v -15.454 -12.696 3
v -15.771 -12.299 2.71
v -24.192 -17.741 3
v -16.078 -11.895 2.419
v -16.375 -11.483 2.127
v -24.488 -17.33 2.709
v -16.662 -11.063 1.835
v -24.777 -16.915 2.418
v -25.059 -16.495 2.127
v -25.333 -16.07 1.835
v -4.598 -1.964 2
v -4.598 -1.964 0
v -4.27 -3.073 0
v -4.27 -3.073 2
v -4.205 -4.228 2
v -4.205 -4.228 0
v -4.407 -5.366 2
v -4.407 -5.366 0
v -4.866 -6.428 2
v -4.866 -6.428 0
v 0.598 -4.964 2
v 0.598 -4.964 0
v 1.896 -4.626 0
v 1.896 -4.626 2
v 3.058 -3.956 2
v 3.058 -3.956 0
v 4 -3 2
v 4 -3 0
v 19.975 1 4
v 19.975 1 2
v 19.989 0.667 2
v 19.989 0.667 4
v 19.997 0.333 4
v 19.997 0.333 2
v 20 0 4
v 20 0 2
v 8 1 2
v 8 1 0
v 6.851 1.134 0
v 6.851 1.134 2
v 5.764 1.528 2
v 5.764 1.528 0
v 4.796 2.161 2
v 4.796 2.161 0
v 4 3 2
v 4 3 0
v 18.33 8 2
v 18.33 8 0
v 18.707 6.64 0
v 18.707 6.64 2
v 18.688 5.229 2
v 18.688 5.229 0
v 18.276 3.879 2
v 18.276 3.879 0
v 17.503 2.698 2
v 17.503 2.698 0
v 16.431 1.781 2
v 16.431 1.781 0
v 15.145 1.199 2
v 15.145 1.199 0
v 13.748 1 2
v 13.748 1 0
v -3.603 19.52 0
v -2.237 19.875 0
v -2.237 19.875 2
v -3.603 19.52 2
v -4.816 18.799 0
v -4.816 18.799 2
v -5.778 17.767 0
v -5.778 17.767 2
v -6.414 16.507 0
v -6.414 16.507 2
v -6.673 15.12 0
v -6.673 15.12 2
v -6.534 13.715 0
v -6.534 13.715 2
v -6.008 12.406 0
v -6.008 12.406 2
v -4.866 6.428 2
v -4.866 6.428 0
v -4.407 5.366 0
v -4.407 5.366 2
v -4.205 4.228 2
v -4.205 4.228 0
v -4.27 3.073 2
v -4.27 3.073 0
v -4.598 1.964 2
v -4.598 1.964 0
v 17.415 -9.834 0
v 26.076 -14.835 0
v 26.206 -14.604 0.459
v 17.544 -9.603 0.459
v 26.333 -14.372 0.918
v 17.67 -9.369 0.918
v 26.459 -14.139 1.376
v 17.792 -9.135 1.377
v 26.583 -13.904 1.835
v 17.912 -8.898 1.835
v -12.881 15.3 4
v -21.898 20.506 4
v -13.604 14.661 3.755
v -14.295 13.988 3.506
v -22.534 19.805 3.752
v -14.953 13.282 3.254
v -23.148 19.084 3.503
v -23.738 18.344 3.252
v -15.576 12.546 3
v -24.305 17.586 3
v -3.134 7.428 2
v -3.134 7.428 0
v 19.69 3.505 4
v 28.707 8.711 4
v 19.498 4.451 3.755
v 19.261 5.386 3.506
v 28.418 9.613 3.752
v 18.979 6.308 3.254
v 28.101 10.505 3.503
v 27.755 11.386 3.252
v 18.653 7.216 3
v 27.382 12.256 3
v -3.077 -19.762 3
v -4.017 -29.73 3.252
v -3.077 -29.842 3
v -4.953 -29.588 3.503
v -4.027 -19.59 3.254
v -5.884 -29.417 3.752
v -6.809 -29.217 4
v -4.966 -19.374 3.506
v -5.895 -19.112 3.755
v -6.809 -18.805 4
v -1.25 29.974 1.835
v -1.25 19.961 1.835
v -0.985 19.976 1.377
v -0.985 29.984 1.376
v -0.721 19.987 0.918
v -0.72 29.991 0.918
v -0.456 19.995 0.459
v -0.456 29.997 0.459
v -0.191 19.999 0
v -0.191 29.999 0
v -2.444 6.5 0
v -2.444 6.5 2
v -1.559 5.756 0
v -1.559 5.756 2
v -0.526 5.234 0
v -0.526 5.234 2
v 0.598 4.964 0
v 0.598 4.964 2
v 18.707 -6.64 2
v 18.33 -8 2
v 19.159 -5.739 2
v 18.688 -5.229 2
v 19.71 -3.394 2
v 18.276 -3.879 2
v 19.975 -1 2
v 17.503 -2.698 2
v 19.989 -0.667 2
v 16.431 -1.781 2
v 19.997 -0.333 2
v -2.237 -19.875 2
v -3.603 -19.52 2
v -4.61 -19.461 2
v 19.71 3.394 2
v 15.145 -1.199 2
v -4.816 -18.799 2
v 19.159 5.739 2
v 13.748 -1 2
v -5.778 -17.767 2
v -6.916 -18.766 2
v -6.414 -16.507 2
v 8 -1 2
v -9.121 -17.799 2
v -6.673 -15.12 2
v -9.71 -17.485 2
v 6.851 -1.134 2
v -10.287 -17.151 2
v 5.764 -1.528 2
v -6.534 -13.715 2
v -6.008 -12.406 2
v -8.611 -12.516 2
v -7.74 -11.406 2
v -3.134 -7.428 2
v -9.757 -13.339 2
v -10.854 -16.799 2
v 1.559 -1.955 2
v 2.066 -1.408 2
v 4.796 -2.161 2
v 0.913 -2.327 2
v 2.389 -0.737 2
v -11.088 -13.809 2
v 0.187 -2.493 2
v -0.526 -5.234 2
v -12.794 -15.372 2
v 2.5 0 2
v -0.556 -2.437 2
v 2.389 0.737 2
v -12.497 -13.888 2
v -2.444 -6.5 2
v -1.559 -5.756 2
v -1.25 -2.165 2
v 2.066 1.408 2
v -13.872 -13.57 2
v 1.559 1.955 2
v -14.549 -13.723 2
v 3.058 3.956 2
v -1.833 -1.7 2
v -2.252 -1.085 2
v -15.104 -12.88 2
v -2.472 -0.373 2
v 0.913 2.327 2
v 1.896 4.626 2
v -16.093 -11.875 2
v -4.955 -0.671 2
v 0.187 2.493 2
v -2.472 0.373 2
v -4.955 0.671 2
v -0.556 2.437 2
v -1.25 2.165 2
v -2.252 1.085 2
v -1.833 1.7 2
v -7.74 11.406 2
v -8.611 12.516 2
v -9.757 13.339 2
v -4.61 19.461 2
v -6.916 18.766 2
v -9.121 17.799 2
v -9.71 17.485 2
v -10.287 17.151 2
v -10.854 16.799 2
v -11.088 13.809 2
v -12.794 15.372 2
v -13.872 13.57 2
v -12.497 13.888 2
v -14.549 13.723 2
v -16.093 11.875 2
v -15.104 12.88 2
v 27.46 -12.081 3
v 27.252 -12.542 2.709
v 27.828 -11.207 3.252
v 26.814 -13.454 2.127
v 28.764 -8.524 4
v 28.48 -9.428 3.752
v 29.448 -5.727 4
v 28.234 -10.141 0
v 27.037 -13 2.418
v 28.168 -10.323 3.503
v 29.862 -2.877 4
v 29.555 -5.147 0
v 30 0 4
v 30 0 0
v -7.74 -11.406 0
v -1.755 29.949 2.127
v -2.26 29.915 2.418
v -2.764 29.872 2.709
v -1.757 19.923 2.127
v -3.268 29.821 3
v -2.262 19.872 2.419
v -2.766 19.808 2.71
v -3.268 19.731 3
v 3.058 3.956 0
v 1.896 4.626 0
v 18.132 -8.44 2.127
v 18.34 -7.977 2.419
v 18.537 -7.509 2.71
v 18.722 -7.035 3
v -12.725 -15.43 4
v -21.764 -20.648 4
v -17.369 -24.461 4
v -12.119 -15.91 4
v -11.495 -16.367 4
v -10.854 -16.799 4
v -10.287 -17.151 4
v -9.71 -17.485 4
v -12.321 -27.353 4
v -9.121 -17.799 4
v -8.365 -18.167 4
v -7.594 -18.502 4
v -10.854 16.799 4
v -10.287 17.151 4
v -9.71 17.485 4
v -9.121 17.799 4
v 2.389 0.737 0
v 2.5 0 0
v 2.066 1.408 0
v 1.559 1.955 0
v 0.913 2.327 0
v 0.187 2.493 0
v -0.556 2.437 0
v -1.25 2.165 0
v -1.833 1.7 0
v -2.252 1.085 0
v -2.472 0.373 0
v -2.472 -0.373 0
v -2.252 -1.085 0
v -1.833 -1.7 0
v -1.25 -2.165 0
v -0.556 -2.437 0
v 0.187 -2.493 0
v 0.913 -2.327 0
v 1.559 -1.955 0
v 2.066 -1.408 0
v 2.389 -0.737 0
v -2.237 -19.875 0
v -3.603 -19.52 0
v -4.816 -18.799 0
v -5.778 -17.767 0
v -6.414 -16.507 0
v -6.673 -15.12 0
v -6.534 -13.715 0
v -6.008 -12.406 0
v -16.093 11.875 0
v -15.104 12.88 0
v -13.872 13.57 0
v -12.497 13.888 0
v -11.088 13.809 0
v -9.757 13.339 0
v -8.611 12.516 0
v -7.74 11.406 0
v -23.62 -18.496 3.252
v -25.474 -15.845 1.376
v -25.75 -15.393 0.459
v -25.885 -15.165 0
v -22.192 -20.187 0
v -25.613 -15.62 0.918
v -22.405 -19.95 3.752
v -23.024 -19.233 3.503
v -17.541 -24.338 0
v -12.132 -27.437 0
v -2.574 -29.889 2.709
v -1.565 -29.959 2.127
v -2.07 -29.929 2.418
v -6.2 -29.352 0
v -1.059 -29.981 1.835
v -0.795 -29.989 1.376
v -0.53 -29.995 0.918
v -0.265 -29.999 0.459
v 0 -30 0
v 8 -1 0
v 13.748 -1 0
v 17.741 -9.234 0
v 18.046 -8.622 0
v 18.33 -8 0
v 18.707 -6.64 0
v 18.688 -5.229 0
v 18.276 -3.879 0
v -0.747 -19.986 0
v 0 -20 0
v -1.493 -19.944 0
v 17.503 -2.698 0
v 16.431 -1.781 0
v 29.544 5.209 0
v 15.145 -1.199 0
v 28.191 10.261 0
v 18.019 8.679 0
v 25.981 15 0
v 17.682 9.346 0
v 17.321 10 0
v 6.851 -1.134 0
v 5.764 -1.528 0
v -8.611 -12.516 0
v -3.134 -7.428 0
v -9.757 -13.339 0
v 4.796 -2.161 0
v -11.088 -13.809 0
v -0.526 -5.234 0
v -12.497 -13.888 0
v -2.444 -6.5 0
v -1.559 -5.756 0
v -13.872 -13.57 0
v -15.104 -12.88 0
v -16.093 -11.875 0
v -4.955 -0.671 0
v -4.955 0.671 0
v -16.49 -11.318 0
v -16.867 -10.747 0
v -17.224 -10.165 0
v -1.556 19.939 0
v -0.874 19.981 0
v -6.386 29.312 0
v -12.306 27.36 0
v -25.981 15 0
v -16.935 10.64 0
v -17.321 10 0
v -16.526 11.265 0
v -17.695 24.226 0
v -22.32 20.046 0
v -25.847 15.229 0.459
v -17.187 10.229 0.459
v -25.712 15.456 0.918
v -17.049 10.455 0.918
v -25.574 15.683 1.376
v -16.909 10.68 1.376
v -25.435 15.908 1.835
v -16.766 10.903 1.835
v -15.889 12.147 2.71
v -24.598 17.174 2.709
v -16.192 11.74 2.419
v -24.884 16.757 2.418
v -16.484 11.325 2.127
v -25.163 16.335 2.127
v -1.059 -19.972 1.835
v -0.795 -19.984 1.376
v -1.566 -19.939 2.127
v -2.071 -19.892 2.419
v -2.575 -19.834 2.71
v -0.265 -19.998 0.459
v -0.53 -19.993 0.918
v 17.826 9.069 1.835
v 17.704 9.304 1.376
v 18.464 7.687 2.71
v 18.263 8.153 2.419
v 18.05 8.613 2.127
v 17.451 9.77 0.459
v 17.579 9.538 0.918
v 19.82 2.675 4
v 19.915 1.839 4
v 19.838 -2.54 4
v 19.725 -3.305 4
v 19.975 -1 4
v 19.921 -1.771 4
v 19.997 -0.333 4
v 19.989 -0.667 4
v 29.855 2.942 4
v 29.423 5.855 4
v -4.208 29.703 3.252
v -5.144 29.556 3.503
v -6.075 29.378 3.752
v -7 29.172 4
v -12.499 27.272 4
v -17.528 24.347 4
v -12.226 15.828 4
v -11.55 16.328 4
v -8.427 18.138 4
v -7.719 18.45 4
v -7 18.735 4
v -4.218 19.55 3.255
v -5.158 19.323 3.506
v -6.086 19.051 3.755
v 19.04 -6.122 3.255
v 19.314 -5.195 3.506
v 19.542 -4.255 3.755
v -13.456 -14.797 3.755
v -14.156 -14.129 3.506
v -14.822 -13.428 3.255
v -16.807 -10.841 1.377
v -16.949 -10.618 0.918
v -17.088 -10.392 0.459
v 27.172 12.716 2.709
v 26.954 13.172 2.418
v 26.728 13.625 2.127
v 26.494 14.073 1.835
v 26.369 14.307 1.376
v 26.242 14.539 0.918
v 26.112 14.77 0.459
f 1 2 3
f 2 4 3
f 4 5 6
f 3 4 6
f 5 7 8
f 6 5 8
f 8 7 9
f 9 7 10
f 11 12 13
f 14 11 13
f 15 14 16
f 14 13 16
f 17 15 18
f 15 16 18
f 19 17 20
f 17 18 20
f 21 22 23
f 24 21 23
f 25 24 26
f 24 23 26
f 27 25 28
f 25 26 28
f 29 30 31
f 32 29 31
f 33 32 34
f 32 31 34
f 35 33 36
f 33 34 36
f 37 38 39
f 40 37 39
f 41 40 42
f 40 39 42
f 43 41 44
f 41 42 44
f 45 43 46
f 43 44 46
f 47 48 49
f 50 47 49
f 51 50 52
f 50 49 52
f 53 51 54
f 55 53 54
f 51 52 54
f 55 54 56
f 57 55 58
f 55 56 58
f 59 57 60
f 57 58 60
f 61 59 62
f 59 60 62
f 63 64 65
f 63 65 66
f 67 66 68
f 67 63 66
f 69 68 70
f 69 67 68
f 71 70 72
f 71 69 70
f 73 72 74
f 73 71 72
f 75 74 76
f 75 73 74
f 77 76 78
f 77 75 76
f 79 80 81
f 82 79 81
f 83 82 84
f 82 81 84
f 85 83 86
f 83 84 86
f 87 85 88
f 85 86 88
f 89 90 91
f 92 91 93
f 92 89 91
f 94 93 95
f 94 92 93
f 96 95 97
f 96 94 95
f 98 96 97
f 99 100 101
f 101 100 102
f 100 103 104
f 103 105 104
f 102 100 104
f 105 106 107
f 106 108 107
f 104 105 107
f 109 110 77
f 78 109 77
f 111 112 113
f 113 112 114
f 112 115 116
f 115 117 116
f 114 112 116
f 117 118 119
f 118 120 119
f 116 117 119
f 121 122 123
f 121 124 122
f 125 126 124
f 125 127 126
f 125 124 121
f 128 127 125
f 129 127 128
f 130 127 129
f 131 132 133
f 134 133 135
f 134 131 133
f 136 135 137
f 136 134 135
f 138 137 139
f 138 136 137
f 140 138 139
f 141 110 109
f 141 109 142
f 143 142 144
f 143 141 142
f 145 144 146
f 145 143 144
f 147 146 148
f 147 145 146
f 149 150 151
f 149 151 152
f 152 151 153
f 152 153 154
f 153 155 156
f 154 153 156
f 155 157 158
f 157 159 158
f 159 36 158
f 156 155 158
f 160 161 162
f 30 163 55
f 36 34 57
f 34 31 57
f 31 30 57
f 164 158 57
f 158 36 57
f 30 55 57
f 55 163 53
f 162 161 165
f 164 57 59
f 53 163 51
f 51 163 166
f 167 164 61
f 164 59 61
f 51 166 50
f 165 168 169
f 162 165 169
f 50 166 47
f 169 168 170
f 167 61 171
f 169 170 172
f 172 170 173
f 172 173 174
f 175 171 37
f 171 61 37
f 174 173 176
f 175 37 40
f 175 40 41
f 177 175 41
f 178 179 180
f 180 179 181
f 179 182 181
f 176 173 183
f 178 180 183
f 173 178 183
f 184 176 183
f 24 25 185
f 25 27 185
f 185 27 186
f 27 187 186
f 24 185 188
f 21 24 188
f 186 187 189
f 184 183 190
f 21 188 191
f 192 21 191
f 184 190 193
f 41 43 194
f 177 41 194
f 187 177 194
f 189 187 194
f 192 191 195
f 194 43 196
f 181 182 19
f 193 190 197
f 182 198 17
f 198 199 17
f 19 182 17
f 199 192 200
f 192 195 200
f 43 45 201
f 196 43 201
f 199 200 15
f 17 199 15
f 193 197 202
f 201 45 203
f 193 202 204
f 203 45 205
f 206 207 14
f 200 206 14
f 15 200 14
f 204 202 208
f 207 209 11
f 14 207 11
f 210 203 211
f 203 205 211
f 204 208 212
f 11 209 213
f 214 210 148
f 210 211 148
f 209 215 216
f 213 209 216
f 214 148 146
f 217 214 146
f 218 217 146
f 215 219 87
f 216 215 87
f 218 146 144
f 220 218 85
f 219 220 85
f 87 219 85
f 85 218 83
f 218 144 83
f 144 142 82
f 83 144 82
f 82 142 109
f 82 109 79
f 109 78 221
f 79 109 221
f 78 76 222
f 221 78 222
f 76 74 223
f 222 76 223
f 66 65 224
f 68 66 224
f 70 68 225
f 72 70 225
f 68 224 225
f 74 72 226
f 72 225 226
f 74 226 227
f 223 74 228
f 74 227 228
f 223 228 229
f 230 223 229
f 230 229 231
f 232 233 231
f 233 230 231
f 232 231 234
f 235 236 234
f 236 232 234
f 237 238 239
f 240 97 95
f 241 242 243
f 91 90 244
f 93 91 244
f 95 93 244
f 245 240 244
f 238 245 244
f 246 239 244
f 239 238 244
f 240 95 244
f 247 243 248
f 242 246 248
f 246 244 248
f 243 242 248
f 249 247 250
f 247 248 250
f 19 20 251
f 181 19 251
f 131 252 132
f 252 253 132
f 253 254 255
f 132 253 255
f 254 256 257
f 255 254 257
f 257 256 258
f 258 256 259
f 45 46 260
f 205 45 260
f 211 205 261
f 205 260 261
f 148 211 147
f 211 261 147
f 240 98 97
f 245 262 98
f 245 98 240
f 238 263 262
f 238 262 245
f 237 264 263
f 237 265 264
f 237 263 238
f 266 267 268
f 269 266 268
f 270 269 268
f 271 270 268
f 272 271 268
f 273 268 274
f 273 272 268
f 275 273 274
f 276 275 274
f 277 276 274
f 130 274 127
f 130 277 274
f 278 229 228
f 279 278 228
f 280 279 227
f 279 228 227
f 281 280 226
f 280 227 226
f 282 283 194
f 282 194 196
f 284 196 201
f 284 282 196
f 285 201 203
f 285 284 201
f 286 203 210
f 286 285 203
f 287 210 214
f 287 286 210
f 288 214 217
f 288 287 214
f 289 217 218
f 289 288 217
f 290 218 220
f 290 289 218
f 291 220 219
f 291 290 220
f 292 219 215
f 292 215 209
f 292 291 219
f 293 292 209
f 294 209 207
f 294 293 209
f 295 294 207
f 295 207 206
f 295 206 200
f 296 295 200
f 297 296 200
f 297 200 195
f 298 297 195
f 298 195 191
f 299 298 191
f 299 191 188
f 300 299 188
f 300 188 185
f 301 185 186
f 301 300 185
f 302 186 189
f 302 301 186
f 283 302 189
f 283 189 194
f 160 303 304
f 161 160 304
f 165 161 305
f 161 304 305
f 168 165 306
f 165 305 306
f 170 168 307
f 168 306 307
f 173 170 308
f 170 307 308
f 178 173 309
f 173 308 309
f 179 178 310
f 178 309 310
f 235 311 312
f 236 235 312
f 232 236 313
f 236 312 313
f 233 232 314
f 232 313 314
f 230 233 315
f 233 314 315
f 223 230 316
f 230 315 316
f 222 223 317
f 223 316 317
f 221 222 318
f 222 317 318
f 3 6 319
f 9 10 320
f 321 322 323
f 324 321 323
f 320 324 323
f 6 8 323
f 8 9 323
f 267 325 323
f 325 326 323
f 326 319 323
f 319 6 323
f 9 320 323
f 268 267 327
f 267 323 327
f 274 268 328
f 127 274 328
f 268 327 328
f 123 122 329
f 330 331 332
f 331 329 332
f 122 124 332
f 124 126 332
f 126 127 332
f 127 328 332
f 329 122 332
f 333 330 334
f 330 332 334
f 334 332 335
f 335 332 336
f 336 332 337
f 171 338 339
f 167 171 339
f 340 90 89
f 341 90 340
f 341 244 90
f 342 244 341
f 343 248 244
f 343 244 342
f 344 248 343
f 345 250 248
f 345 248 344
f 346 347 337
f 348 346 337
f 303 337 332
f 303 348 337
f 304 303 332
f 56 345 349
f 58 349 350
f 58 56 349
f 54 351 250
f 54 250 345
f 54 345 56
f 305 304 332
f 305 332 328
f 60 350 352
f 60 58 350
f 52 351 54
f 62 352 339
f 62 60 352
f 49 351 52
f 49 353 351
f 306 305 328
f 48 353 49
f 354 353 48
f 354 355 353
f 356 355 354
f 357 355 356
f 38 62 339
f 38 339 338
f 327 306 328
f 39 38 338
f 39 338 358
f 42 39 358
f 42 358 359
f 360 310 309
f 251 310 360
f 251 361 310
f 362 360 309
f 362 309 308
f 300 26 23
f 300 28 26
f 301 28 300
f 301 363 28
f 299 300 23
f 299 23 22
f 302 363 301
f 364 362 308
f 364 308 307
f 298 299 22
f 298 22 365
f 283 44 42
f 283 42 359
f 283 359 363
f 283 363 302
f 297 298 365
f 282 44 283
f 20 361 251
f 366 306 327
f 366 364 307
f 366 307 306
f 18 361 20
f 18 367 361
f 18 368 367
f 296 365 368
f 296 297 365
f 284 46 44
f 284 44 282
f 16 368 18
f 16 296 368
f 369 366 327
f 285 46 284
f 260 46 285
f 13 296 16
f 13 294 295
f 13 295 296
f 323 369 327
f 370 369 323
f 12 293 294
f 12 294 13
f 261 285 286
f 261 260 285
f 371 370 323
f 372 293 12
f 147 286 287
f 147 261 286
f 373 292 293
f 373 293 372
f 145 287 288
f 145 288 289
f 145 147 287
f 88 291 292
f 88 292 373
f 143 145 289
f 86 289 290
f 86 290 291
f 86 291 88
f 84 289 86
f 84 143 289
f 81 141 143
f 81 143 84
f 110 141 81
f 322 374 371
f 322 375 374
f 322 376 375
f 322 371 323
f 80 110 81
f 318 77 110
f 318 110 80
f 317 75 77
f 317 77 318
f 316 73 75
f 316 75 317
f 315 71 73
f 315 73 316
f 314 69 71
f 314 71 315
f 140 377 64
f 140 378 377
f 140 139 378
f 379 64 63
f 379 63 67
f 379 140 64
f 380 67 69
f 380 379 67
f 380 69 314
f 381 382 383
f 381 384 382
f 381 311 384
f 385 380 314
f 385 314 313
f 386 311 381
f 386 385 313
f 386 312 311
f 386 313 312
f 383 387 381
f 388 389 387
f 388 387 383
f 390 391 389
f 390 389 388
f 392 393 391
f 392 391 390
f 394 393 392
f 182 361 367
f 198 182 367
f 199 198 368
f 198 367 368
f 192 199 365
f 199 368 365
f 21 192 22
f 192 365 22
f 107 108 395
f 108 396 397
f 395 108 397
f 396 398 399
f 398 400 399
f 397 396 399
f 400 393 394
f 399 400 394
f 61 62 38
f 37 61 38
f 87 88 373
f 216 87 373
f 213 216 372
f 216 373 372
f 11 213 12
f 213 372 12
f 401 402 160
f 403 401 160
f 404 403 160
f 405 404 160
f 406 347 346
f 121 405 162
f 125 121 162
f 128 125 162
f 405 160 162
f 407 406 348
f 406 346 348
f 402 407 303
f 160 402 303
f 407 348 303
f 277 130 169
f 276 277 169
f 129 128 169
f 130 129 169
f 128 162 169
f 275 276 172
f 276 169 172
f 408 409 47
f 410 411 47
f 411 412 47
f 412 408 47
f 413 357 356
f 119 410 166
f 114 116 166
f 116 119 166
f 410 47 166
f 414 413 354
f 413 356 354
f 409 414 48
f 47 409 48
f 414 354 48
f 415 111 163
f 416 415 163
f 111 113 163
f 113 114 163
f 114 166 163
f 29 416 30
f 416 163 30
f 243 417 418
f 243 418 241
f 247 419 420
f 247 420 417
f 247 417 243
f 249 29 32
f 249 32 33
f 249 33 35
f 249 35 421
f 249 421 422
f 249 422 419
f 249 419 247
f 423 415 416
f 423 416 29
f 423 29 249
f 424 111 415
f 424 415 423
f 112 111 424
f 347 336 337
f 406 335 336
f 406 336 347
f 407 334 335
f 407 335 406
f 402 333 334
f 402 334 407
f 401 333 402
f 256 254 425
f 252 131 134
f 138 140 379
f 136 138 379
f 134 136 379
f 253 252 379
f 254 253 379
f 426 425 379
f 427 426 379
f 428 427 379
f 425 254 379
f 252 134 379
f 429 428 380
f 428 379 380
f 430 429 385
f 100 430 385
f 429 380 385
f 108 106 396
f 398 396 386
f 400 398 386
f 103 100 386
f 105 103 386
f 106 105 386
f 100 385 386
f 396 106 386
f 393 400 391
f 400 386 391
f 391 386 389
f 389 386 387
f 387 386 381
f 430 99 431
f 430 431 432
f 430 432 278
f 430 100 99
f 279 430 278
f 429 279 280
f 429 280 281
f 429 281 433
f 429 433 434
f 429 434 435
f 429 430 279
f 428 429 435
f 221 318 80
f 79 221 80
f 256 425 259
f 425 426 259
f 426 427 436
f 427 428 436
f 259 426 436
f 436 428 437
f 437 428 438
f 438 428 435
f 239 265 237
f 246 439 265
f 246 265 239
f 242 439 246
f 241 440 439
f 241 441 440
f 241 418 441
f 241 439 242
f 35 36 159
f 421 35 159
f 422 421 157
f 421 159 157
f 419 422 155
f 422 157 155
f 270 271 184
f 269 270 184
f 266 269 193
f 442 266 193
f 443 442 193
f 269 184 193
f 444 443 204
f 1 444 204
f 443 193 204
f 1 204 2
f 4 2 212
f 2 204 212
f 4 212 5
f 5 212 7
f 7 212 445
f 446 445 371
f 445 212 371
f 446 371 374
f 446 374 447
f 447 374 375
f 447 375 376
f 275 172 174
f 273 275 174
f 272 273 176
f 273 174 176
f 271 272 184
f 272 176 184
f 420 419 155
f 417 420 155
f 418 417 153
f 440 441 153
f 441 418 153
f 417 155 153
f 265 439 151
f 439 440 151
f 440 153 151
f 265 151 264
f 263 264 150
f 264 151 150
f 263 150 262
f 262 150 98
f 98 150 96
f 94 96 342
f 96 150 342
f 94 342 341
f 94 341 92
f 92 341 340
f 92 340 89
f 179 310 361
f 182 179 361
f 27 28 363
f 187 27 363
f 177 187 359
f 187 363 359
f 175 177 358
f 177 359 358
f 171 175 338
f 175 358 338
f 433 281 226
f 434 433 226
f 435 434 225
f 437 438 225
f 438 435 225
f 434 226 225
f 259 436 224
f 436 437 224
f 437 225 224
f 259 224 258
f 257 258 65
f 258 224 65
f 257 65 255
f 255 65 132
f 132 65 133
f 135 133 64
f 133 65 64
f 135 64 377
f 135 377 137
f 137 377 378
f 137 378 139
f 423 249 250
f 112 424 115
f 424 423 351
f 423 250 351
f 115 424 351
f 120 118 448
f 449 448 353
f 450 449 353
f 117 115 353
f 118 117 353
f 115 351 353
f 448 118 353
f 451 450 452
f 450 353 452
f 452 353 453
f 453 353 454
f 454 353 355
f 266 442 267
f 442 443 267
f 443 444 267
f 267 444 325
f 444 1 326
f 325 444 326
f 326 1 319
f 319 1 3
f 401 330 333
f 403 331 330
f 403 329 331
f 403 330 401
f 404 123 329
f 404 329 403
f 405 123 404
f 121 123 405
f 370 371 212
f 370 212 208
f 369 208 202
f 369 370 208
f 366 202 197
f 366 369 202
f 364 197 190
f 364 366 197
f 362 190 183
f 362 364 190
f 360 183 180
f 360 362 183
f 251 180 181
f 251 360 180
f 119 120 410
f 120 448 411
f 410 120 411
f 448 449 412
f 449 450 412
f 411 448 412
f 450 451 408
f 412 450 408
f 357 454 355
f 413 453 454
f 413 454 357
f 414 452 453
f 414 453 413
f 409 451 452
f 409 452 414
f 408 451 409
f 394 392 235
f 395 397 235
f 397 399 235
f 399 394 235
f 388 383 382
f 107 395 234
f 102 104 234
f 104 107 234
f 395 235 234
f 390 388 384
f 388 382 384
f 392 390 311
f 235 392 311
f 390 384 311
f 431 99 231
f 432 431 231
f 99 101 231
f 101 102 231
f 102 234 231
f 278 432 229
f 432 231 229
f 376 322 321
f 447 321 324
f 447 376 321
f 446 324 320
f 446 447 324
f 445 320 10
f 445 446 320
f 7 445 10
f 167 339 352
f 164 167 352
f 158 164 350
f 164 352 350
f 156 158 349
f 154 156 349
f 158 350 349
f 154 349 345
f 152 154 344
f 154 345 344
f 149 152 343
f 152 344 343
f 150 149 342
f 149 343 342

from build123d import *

# Parameters (mm, degrees)
F0_R        = 2.5
F1_DEPTH    = 2
F2_DEPTH    = 4
F3_T1_DEPTH = 2
F4_T1_DEPTH = 32.4048198529
F4_T3_DEPTH = 32.4048198529
F4_T5_DEPTH = 32.4048198529
F5_SIZE2    = 2.309391
F5_SIZE     = 3.99999
F5_2_SIZE2  = 2.309391
F5_2_SIZE   = 3.99999
F5_3_SIZE2  = 2.309391
F5_3_SIZE   = 3.99999
F6_SIZE     = 2.5
F7_SIZE     = 2


# Not quite as in the source:
# - a fillet or chamfer that OpenCascade refuses, or shapes differently, is made with other operations: its cross-section is extruded or revolved along the edge and cut away or added
# - a fillet or chamfer is up to 0.001 mm smaller than in the source, because OpenCascade refuses the exact size


with BuildPart() as f1:
    # F0 (on Top) → F1 (new body)
    with BuildSketch(Plane.XY):
        with BuildLine():
            ThreePointArc((-10.8535175815, -16.798843892), (-10, -17.3205080757), (-9.1214667739, -17.798843892))
            Line((-9.1214667739, -17.798843892), (-1.583464339, -4.7426406871))
            ThreePointArc((-1.583464339, -4.7426406871), (-2.5, -4.3301270189), (-3.3155151466, -3.7426406871))
            Line((-3.3155151466, -3.7426406871), (-10.8535175815, -16.798843892))
        make_face()
        with BuildLine():
            Line((-1.583464339, 4.7426406871), (-9.1214667739, 17.798843892))
            ThreePointArc((-9.1214667739, 17.798843892), (-10, 17.3205080757), (-10.8535175815, 16.798843892))
            Line((-10.8535175815, 16.798843892), (-3.3155151466, 3.7426406871))
            ThreePointArc((-3.3155151466, 3.7426406871), (-2.5, 4.3301270189), (-1.583464339, 4.7426406871))
        make_face()
        with BuildLine():
            ThreePointArc((20, 0), (19.9937451108, 0.5001564212), (19.9749843554, 1))
            Line((19.9749843554, 1), (4.8989794856, 1))
            ThreePointArc((4.8989794856, 1), (4.974680765, 0.50254481), (5, 0))
            ThreePointArc((5, 0), (4.974680765, -0.50254481), (4.8989794856, -1))
            Line((4.8989794856, -1), (19.9749843554, -1))
            ThreePointArc((19.9749843554, -1), (19.9937451108, -0.5001564212), (20, 0))
        make_face()
        with BuildLine():
            ThreePointArc((5, 0), (4.974680765, 0.50254481), (4.8989794856, 1))
            ThreePointArc((4.8989794856, 1), (2.5, 4.3301270189), (-1.583464339, 4.7426406871))
            ThreePointArc((-1.583464339, 4.7426406871), (-2.5, 4.3301270189), (-3.3155151466, 3.7426406871))
            ThreePointArc((-3.3155151466, 3.7426406871), (-5, 0), (-3.3155151466, -3.7426406871))
            ThreePointArc((-3.3155151466, -3.7426406871), (-2.5, -4.3301270189), (-1.583464339, -4.7426406871))
            ThreePointArc((-1.583464339, -4.7426406871), (2.5, -4.3301270189), (4.8989794856, -1))
            ThreePointArc((4.8989794856, -1), (4.974680765, -0.50254481), (5, 0))
        make_face()
        Circle(F0_R, mode=Mode.SUBTRACT)
    extrude(amount=F1_DEPTH)

    # F0 (on Top) → F2 (join)
    with BuildSketch(Plane.XY):
        with BuildLine():
            Line((0, 20), (0, 30))
            ThreePointArc((0, 30), (-15, 25.9807621135), (-25.9807621135, 15))
            Line((-25.9807621135, 15), (-17.3205080757, 10))
            ThreePointArc((-17.3205080757, 10), (-14.4913767462, 13.7840487521), (-10.8535175815, 16.798843892))
            ThreePointArc((-10.8535175815, 16.798843892), (-10, 17.3205080757), (-9.1214667739, 17.798843892))
            ThreePointArc((-9.1214667739, 17.798843892), (-4.6916480132, 19.4419247741), (0, 20))
        make_face()
        with BuildLine():
            ThreePointArc((25.9807621135, -15), (28.9777747887, -7.7645713531), (30, 0))
            ThreePointArc((30, 0), (28.9777747887, 7.7645713531), (25.9807621135, 15))
            Line((25.9807621135, 15), (17.3205080757, 10))
            ThreePointArc((17.3205080757, 10), (19.1830247594, 5.657876022), (19.9749843554, 1))
            ThreePointArc((19.9749843554, 1), (19.9937451108, 0.5001564212), (20, 0))
            ThreePointArc((20, 0), (19.9937451108, -0.5001564212), (19.9749843554, -1))
            ThreePointArc((19.9749843554, -1), (19.1830247594, -5.657876022), (17.3205080757, -10))
            Line((17.3205080757, -10), (25.9807621135, -15))
        make_face()
        with BuildLine():
            ThreePointArc((-25.9807621135, -15), (-15, -25.9807621135), (0, -30))
            Line((0, -30), (0, -20))
            ThreePointArc((0, -20), (-4.6916480132, -19.4419247741), (-9.1214667739, -17.798843892))
            ThreePointArc((-9.1214667739, -17.798843892), (-10, -17.3205080757), (-10.8535175815, -16.798843892))
            ThreePointArc((-10.8535175815, -16.798843892), (-14.4913767462, -13.7840487521), (-17.3205080757, -10))
            Line((-17.3205080757, -10), (-25.9807621135, -15))
        make_face()
    extrude(amount=F2_DEPTH)

    # F3: fillet of radius 5 on 12 edges, made by hand

    # F3_s2 → F3_t1 (join)
    with BuildSketch(Plane.XY):
        with BuildLine():
            ThreePointArc((-2.2369481596, 19.8745078664), (-6.1410694312, 17.1594186926), (-6.0078381387, 12.4058808998))
            Line((-6.0078381387, 12.4058808998), (-9.1214667739, 17.798843892))
            ThreePointArc((-9.1214667739, 17.798843892), (-5.7732566792, 19.148616329), (-2.2369481596, 19.8745078664))
        make_face()
        with BuildLine():
            ThreePointArc((-16.0933546202, 11.8745078664), (-11.7899577863, 13.8980314801), (-7.7398889462, 11.4058808998))
            Line((-7.7398889462, 11.4058808998), (-10.8535175815, 16.798843892))
            ThreePointArc((-10.8535175815, 16.798843892), (-13.6965598486, 14.5740951113), (-16.0933546202, 11.8745078664))
        make_face()
        with BuildLine():
            ThreePointArc((18.3303027798, 8), (17.9310272175, 3.2613872125), (13.7477270849, 1))
            Line((13.7477270849, 1), (19.9749843554, 1))
            ThreePointArc((19.9749843554, 1), (19.4698165279, 4.5745212177), (18.3303027798, 8))
        make_face()
        with BuildLine():
            ThreePointArc((13.7477270849, -1), (17.9310272175, -3.2613872125), (18.3303027798, -8))
            ThreePointArc((18.3303027798, -8), (19.4698165279, -4.5745212177), (19.9749843554, -1))
            Line((19.9749843554, -1), (13.7477270849, -1))
        make_face()
        with BuildLine():
            ThreePointArc((-16.0933546202, -11.8745078664), (-11.7899577863, -13.8980314801), (-7.7398889462, -11.4058808998))
            Line((-7.7398889462, -11.4058808998), (-10.8535175815, -16.798843892))
            ThreePointArc((-10.8535175815, -16.798843892), (-13.6965598486, -14.5740951113), (-16.0933546202, -11.8745078664))
        make_face()
        with BuildLine():
            ThreePointArc((-2.2369481596, -19.8745078664), (-6.1410694312, -17.1594186926), (-6.0078381387, -12.4058808998))
            Line((-6.0078381387, -12.4058808998), (-9.1214667739, -17.798843892))
            ThreePointArc((-9.1214667739, -17.798843892), (-5.7732566792, -19.148616329), (-2.2369481596, -19.8745078664))
        make_face()
        with BuildLine():
            ThreePointArc((-3.1339745962, 7.4282032303), (-1.5587969348, 5.7556435797), (0.5980762114, 4.9641016151))
            ThreePointArc((0.5980762114, 4.9641016151), (-0.5049838375, 4.9744337692), (-1.583464339, 4.7426406871))
            Line((-1.583464339, 4.7426406871), (-3.1339745962, 7.4282032303))
        make_face()
        with BuildLine():
            ThreePointArc((8, 1), (5.7639320225, 1.527864045), (4, 3))
            ThreePointArc((4, 3), (4.5604779323, 2.0498880528), (4.8989794856, 1))
            Line((4.8989794856, 1), (8, 1))
        make_face()
        with BuildLine():
            ThreePointArc((-4.8660254038, 6.4282032303), (-4.2051350877, 4.2277795347), (-4.5980762114, 1.9641016151))
            ThreePointArc((-4.5980762114, 1.9641016151), (-4.0554940948, 2.9245457164), (-3.3155151466, 3.7426406871))
            Line((-3.3155151466, 3.7426406871), (-4.8660254038, 6.4282032303))
        make_face()
        with BuildLine():
            ThreePointArc((-4.5980762114, -1.9641016151), (-4.2051350877, -4.2277795347), (-4.8660254038, -6.4282032303))
            Line((-4.8660254038, -6.4282032303), (-3.3155151466, -3.7426406871))
            ThreePointArc((-3.3155151466, -3.7426406871), (-4.0554940948, -2.9245457164), (-4.5980762114, -1.9641016151))
        make_face()
        with BuildLine():
            ThreePointArc((-3.1339745962, -7.4282032303), (-1.5587969348, -5.7556435797), (0.5980762114, -4.9641016151))
            ThreePointArc((0.5980762114, -4.9641016151), (-0.5049838375, -4.9744337692), (-1.583464339, -4.7426406871))
            Line((-1.583464339, -4.7426406871), (-3.1339745962, -7.4282032303))
        make_face()
        with BuildLine():
            ThreePointArc((4, -3), (5.7639320225, -1.527864045), (8, -1))
            Line((8, -1), (4.8989794856, -1))
            ThreePointArc((4.8989794856, -1), (4.5604779323, -2.0498880528), (4, -3))
        make_face()
    extrude(amount=F3_T1_DEPTH)

    # F4: chamfer of 2.5 x 4.3301270189 on 3 edges, made by hand

    # F4_s2 → F4_t1 (cut)
    with BuildSketch(Plane(origin=(-7.6189364958, -4.3987950368, 0), x_dir=(0, 0, 1), z_dir=(-0.8660254038, -0.5, 0))):
        Polygon((-0.3301270189, 0), (4, -2.5), (4, 0), align=None)
    extrude(amount=F4_T1_DEPTH, mode=Mode.SUBTRACT)

    # F4_s4 → F4_t3 (cut)
    with BuildSketch(Plane.XZ.offset(-41.2024099265)):
        Polygon((-2.5, 4), (0, -0.3301270189), (0, 4), align=None)
    extrude(amount=F4_T3_DEPTH, mode=Mode.SUBTRACT)

    # F4_s6 → F4_t5 (cut)
    with BuildSketch(Plane(origin=(7.6189364958, -4.3987950368, 0), x_dir=(0, 0, 1), z_dir=(0.8660254038, -0.5, 0))):
        Polygon((-0.3301270189, 0), (4, -2.5), (4, 0), align=None)
    extrude(amount=F4_T5_DEPTH, mode=Mode.SUBTRACT)

    # F5 (size 4 and 2.3094010768 in the source; OpenCascade refuses exactly that, so slightly less here)
    f5_edges = [f1.edges().sort_by_distance(p)[0] for p in [
        (21.650635, 12.5, 4),
    ]]
    f5_side = f1.faces().sort_by_distance((21.650635, 12.5, 2))[0]
    chamfer(f5_edges, length=F5_SIZE, length2=F5_SIZE2, reference=f5_side)

    # F5#2 (size 4 and 2.3094010768 in the source; OpenCascade refuses exactly that, so slightly less here)
    f5_2_edges = [f1.edges().sort_by_distance(p)[0] for p in [
        (-21.650635, 12.5, 4),
    ]]
    f5_2_side = f1.faces().sort_by_distance((-21.650635, 12.5, 2))[0]
    chamfer(f5_2_edges, length=F5_2_SIZE, length2=F5_2_SIZE2, reference=f5_2_side)

    # F5#3 (size 4 and 2.3094010768 in the source; OpenCascade refuses exactly that, so slightly less here)
    f5_3_edges = [f1.edges().sort_by_distance(p)[0] for p in [
        (0, -25, 4),
    ]]
    f5_3_side = f1.faces().sort_by_distance((0, -25, 2))[0]
    chamfer(f5_3_edges, length=F5_3_SIZE, length2=F5_3_SIZE2, reference=f5_3_side)

    # F6
    f6_edges = [f1.edges().sort_by_distance(p)[0] for p in [
        (-20.399464, 14.444291, 4),
        (-2.5, 24.869393, 4),
        (22.708855, 10.444309, 4),
        (22.787526, -10.269633, 4),
        (-2.309391, -24.8886, 4),
        (-20.287526, -14.59976, 4),
    ]]
    chamfer(f6_edges, length=F6_SIZE)

    # F7
    f7_edges = [f1.edges().sort_by_distance(p)[0] for p in [
        (-5, 24.472658, 4),
        (-18.823804, 16.421335, 4),
        (23.633195, 8.091225, 4),
        (23.693943, -7.906202, 4),
        (-4.809391, -24.51256, 4),
        (-18.693943, -16.566456, 4),
    ]]
    chamfer(f7_edges, length=F7_SIZE)


solid = f1.part
